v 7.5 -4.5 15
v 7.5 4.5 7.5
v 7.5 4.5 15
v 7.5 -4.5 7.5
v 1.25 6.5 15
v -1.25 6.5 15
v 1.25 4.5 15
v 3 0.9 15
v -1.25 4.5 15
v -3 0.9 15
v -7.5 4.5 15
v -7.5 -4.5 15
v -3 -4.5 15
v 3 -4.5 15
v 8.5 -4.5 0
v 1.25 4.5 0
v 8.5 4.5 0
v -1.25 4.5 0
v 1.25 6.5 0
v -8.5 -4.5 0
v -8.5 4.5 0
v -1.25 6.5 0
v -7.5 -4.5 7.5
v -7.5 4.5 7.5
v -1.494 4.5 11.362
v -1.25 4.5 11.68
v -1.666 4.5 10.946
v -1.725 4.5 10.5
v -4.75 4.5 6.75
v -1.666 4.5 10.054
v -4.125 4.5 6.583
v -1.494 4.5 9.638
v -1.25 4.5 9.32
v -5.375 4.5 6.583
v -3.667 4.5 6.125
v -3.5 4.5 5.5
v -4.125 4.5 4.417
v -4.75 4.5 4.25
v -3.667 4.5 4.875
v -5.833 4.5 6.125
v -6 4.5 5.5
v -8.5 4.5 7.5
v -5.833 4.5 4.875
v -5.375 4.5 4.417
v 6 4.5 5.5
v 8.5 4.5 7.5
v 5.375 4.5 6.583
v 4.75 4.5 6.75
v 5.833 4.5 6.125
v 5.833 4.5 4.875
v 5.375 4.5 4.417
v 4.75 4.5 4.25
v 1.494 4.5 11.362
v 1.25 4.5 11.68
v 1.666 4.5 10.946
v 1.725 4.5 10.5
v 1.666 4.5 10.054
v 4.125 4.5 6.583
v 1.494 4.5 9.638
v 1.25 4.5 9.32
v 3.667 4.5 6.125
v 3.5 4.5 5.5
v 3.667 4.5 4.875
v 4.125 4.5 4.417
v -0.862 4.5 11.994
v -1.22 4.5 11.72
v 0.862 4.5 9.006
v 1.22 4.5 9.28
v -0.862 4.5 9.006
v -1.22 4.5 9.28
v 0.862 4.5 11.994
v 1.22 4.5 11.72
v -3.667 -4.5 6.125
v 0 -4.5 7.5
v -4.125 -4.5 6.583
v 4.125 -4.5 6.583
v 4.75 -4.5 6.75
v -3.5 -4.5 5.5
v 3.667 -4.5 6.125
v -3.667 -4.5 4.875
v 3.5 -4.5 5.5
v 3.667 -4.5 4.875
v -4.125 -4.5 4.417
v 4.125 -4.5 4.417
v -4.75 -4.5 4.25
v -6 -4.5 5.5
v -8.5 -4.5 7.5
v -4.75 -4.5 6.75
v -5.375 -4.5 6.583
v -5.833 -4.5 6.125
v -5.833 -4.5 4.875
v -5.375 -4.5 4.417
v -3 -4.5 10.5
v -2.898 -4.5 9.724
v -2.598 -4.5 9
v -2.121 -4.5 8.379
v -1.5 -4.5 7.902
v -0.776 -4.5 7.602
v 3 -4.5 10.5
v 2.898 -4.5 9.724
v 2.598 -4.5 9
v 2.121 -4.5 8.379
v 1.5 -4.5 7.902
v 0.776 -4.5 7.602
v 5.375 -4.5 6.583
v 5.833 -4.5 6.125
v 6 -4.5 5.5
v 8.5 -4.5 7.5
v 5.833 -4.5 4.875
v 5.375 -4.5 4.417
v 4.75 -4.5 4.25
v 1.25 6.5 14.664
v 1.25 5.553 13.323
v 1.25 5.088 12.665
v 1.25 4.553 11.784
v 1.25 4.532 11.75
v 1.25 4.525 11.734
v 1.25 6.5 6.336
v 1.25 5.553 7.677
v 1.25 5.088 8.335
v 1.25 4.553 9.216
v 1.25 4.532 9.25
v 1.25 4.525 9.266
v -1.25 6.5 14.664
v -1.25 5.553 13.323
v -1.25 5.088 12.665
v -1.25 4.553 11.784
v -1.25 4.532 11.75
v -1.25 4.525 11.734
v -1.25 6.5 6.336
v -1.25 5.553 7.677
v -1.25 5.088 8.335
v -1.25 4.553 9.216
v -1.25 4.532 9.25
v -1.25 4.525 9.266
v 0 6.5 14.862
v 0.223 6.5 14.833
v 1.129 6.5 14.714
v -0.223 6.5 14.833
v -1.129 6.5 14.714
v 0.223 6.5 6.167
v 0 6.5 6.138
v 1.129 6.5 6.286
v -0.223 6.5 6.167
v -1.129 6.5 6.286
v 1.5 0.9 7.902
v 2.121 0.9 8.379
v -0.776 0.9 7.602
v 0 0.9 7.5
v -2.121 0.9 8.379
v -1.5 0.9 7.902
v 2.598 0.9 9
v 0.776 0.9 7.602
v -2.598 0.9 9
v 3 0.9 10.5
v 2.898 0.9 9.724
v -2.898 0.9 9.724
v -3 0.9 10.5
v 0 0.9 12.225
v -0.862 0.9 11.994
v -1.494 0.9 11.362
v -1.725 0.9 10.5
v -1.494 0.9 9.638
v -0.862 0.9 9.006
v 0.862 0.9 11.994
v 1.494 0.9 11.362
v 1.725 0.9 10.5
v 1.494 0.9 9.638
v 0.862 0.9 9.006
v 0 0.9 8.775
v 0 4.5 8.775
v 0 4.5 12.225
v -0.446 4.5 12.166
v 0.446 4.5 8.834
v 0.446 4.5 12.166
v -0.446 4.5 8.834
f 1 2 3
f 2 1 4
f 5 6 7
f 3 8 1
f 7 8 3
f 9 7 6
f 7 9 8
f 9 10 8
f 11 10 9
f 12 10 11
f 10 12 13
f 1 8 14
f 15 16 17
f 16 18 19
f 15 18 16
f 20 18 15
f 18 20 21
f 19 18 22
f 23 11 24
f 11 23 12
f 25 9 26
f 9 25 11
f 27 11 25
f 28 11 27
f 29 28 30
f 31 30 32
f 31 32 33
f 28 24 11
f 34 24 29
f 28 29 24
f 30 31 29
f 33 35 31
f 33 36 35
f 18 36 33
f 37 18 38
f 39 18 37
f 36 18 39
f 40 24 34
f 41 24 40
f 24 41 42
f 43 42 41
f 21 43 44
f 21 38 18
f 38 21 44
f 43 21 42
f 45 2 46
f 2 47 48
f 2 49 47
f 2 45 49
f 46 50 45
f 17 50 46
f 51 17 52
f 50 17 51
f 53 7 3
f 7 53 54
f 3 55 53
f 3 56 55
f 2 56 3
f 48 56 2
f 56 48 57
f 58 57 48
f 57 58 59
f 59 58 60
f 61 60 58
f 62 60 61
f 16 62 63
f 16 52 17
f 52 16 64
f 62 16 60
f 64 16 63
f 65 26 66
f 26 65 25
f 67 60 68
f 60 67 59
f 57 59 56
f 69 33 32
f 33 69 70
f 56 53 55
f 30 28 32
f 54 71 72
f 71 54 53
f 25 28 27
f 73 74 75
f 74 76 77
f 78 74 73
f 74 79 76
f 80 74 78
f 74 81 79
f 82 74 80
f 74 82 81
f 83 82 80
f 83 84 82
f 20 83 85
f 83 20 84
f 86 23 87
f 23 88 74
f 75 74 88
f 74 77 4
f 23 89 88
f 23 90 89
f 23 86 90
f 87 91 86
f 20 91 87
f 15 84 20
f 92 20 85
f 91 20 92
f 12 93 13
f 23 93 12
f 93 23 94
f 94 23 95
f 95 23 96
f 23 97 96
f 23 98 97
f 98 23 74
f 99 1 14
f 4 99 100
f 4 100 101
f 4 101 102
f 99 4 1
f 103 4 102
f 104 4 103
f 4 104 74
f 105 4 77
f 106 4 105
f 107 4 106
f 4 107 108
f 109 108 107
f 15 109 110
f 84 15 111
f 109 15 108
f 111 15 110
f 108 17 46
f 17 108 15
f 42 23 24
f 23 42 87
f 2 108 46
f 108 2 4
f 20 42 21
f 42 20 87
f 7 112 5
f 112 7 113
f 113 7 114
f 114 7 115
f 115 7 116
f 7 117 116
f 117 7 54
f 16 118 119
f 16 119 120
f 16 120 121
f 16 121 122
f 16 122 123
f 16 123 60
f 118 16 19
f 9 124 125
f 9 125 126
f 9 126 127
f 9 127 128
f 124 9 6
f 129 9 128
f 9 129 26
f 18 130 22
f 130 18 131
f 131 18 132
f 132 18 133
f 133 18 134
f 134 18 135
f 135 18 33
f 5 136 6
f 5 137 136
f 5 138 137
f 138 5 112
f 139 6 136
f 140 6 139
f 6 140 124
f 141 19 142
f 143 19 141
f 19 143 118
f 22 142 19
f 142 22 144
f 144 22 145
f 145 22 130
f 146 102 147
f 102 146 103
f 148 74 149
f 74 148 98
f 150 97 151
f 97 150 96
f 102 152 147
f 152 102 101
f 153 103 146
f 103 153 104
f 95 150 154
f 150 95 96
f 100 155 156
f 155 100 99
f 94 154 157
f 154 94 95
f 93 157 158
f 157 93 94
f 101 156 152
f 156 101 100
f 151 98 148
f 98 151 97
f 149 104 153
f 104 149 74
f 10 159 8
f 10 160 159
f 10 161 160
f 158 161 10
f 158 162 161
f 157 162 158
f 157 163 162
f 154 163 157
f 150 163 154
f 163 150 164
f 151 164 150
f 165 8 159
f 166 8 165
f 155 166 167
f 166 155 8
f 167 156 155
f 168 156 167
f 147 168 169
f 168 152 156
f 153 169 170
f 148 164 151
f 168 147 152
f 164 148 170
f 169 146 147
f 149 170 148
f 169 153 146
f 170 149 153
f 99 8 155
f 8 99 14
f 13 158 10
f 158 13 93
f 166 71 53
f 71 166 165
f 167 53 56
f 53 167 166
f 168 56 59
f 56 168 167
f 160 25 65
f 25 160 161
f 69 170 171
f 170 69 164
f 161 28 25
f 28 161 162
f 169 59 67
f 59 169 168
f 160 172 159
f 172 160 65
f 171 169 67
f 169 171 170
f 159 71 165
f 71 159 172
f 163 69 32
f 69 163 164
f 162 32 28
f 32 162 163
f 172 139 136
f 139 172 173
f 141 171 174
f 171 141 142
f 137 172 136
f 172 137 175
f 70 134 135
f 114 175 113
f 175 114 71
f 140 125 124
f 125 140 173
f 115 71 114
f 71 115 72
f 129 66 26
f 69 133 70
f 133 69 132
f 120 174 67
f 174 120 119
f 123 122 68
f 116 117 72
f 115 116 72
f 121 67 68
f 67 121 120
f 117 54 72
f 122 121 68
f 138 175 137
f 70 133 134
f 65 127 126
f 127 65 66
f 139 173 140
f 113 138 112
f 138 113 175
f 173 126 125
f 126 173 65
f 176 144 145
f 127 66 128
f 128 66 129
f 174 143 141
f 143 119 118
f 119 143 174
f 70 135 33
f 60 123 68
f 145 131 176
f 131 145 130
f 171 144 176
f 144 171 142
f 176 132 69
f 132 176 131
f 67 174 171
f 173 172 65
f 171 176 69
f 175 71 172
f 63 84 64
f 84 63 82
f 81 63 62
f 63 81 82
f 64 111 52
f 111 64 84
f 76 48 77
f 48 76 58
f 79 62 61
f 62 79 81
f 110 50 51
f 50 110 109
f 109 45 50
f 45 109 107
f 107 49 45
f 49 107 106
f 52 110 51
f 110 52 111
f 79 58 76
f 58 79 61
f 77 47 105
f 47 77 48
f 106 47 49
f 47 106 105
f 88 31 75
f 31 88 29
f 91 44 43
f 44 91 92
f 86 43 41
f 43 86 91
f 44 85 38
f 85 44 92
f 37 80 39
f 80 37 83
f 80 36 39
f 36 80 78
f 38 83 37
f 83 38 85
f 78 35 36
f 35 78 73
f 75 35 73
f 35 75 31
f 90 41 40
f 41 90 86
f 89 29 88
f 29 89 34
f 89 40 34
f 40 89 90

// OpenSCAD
// file: microswitch.scad
// Don't print this file, purchase real micro switches
// e.g. Honeywell ZM10B10A01 or OMRON SS-5 or similar.

module microswitch() {
  difference() {
    union() {
      translate([0, 0, 2.5])
        cube([19.8, 6, 10], center=true);
      translate([2.5, 0.5, 6])
        cube([2, 3.5, 5], center=true);
      for (x = [-8, -1, 8]) {
        translate([x, 0, 0])
          cube([0.6, 3.2, 13], center=true);
      }
    }
    for (x = [-9.5/2, 9.5/2]) {
      translate([x, 0, 0]) rotate([90, 0, 0])
        cylinder(r=2.5/2, h=20, center=true, $fn=12);
    }
  }
}

microswitch();
// file: configuration.scad
// Increase this if your slicer or printer make holes too tight.
extra_radius = 0.1;

// OD = outside diameter, corner to corner.
m3_nut_od = 6.1;
m3_nut_radius = m3_nut_od/2 + 0.2 + extra_radius;

// Major diameter of metric 3mm thread.
m3_major = 2.85;
m3_radius = m3_major/2 + extra_radius;
m3_wide_radius = m3_major/2 + extra_radius + 0.2;

// NEMA17 stepper motors.
motor_shaft_diameter = 5;
motor_shaft_radius = motor_shaft_diameter/2 + extra_radius;

// Frame brackets. M3x8mm screws work best with 3.6 mm brackets.
thickness = 3.6;

// OpenBeam or Misumi. Currently only 15x15 mm, but there is a plan
// to make models more parametric and allow 20x20 mm in the future.
extrusion = 15;
// main file
include <configuration.scad>;

use <microswitch.scad>;

thickness = 9;  // 1mm thicker than linear rail.
width = 15;  // Same as vertical extrusion.
height = 15;

module endstop() {
  difference() {
    union() {
      cube([width, thickness, height], center=true);
      translate([0, 0, -height/4])
        cube([width+2, thickness, height/2], center=true);
      translate([0, 2, 0])
        cube([2.5, thickness, height], center=true);
    }
    translate([0, 0, 3]) rotate([90, 0, 0]) {
      cylinder(r=m3_wide_radius, h=20, center=true, $fn=12);
      translate([0, 0, 3.6-thickness/2]) {
        cylinder(r=3, h=10, $fn=24);
        translate([0, 5, 5])
          cube([6, 10, 10], center=true);
      }
      translate([0, 0, -thickness/2]) scale([1, 1, -1])
        cylinder(r1=m3_wide_radius, r2=7, h=4, $fn=24);
    }
    translate([0, -3-thickness/2, -2]) rotate([0, 180, 0]) {
      % microswitch();
      for (x = [-9.5/2, 9.5/2]) {
        translate([x, 0, 0]) rotate([90, 0, 0])
          cylinder(r=2.5/2, h=40, center=true, $fn=12);
      }
    }
  }
}

translate([0, 0, height/2]) endstop();
